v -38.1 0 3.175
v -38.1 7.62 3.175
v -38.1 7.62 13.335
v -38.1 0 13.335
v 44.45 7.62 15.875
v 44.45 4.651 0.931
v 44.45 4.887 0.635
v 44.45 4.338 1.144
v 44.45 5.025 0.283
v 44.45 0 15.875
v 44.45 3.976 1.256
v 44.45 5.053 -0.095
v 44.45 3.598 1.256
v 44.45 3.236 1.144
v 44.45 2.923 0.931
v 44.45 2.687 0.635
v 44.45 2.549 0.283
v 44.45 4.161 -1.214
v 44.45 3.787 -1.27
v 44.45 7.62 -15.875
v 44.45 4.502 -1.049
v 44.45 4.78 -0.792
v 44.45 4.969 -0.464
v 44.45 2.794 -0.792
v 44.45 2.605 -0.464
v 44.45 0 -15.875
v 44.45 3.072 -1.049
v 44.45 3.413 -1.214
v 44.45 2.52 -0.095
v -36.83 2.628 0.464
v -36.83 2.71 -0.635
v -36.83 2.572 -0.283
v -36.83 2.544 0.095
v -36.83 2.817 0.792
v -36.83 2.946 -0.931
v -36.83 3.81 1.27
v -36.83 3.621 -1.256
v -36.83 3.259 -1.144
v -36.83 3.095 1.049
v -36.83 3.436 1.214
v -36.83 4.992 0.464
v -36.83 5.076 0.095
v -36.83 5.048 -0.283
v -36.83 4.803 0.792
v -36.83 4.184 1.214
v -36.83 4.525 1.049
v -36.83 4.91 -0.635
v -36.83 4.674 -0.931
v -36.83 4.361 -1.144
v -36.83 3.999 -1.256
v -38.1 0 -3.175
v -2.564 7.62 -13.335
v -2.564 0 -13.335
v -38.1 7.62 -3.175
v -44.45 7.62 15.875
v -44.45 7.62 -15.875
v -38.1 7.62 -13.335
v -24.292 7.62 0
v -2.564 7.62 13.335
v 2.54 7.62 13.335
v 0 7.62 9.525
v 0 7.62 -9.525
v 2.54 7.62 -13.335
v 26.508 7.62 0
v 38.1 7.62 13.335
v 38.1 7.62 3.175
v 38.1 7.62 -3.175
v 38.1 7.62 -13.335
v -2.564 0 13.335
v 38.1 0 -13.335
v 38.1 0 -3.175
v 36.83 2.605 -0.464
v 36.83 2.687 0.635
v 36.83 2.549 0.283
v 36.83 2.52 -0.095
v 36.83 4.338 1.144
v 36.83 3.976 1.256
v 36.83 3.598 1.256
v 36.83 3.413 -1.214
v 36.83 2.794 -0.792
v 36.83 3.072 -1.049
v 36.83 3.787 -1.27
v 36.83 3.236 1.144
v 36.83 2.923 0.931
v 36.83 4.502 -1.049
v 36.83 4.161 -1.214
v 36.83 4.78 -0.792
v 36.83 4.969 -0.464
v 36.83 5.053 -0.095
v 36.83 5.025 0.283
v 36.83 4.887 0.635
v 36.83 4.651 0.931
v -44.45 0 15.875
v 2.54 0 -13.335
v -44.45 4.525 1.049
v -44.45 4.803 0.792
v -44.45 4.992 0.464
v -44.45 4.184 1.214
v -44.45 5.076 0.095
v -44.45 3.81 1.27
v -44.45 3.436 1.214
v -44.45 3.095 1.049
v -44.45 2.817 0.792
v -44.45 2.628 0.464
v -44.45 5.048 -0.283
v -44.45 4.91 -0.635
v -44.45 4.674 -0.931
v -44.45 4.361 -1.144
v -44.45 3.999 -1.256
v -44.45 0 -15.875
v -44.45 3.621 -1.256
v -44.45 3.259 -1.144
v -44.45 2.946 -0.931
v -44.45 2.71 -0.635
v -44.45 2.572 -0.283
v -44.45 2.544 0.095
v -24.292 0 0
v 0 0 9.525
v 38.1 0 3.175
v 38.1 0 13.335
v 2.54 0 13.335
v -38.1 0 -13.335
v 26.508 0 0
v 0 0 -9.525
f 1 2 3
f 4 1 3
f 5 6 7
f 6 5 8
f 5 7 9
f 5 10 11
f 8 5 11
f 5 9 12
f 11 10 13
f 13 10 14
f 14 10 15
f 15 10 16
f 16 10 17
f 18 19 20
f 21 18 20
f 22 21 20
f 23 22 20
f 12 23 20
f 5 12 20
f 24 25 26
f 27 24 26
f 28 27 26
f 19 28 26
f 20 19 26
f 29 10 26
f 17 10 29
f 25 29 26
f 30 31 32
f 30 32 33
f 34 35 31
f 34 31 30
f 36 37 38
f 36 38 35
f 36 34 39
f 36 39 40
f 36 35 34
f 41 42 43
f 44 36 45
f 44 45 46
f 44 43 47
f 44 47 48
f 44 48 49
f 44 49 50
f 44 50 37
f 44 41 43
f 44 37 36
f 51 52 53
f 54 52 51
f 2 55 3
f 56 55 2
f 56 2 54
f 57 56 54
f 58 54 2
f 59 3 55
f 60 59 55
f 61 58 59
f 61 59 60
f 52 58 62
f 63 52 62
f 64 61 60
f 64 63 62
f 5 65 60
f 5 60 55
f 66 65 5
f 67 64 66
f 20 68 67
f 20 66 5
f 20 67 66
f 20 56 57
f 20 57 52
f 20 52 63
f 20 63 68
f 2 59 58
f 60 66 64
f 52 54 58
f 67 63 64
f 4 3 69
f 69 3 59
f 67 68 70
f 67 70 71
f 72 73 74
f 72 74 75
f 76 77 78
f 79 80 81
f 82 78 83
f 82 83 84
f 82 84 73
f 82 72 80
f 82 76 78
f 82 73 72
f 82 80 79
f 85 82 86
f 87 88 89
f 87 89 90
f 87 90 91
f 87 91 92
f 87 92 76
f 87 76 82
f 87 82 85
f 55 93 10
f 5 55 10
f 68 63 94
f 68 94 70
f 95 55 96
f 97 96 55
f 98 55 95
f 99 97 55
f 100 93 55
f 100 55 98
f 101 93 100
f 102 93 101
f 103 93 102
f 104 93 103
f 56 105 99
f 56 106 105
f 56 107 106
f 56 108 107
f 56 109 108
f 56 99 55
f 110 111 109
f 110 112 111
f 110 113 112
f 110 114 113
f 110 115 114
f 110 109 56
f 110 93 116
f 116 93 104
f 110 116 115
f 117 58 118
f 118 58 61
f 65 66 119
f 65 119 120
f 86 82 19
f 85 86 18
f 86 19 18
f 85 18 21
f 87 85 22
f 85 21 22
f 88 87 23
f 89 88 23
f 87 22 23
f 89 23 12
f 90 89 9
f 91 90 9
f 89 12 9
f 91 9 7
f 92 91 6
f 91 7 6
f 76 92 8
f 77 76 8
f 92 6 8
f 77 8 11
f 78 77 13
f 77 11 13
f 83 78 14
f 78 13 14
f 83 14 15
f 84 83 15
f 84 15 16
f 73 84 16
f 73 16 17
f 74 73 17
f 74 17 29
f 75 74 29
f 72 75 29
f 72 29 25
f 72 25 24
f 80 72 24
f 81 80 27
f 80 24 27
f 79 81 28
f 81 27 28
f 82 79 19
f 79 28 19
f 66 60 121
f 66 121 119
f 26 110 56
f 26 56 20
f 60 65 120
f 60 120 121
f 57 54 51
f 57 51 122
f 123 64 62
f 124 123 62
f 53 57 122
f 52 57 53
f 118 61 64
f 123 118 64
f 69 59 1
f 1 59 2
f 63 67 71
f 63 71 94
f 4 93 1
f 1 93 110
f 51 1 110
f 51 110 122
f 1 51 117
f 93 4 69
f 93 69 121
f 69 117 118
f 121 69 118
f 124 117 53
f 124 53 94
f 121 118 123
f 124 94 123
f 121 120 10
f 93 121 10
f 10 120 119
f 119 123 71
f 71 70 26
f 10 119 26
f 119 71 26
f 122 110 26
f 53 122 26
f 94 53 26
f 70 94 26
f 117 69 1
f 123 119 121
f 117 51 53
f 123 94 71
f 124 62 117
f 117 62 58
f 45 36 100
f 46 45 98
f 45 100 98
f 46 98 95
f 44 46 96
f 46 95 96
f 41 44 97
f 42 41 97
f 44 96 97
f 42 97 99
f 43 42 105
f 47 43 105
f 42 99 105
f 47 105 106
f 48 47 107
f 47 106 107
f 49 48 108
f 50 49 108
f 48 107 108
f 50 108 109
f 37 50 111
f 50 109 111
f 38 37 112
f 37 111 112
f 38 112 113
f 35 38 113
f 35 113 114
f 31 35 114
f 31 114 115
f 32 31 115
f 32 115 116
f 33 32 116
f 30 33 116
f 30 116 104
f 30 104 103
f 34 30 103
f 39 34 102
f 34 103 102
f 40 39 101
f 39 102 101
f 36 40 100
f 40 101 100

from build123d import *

# Parameters (mm, degrees)
SKETCH1_W           = 88.9
SKETCH1_H           = 31.75
BOSS_EXTRUDE1_DEPTH = 7.62
CUT_EXTRUDE1_DEPTH  = 29.464
CUT_EXTRUDE2_DEPTH  = 29.464
SKETCH4_R           = 1.27
CUT_EXTRUDE3_DEPTH  = 7.62
SKETCH5_R           = 1.27
CUT_EXTRUDE4_DEPTH  = 7.62


with BuildPart() as part:
    # Sketch1 → Boss-Extrude1 (new body)
    with BuildSketch(Plane(origin=(0, 0, 0), x_dir=(1, 0, 0), z_dir=(0, 1, 0))):
        Rectangle(SKETCH1_W, SKETCH1_H)
    extrude(amount=BOSS_EXTRUDE1_DEPTH)

    # Sketch2 → Cut-Extrude1 (cut)
    with BuildSketch(Plane(origin=(0, 7.62, 0), x_dir=(1, 0, 0), z_dir=(0, 1, 0))):
        Polygon((-38.1, 3.175), (-38.1, 13.335), (-2.563992866, 13.335), align=None)
        Polygon((-38.1, -3.175), (-38.1, -13.335), (-2.563992866, -13.335), align=None)
        Polygon((2.54, 13.335), (38.1, 13.335), (38.1, 3.175), align=None)
        Polygon((38.1, -3.175), (38.1, -13.335), (2.54, -13.335), align=None)
    extrude(amount=-CUT_EXTRUDE1_DEPTH, mode=Mode.SUBTRACT)

    # Sketch3 → Cut-Extrude2 (cut)
    with BuildSketch(Plane(origin=(0, 7.62, 0), x_dir=(1, 0, 0), z_dir=(0, 1, 0))):
        Polygon((0, 9.525), (-24.292421741, 0), (0, -9.525), (26.507578259, 0), align=None)
    extrude(amount=-CUT_EXTRUDE2_DEPTH, mode=Mode.SUBTRACT)

    # Sketch4 → Cut-Extrude3 (cut)
    with BuildSketch(Plane(origin=(44.45, 0, 0), x_dir=(0, 0, -1), z_dir=(1, 0, 0))):
        with Locations((0, 3.786925891)):
            Circle(SKETCH4_R)
    extrude(amount=-CUT_EXTRUDE3_DEPTH, mode=Mode.SUBTRACT)

    # Sketch5 → Cut-Extrude4 (cut)
    with BuildSketch(Plane.ZY.offset(44.45)):
        with Locations((0, 3.81)):
            Circle(SKETCH5_R)
    extrude(amount=-CUT_EXTRUDE4_DEPTH, mode=Mode.SUBTRACT)


solid = part.part
